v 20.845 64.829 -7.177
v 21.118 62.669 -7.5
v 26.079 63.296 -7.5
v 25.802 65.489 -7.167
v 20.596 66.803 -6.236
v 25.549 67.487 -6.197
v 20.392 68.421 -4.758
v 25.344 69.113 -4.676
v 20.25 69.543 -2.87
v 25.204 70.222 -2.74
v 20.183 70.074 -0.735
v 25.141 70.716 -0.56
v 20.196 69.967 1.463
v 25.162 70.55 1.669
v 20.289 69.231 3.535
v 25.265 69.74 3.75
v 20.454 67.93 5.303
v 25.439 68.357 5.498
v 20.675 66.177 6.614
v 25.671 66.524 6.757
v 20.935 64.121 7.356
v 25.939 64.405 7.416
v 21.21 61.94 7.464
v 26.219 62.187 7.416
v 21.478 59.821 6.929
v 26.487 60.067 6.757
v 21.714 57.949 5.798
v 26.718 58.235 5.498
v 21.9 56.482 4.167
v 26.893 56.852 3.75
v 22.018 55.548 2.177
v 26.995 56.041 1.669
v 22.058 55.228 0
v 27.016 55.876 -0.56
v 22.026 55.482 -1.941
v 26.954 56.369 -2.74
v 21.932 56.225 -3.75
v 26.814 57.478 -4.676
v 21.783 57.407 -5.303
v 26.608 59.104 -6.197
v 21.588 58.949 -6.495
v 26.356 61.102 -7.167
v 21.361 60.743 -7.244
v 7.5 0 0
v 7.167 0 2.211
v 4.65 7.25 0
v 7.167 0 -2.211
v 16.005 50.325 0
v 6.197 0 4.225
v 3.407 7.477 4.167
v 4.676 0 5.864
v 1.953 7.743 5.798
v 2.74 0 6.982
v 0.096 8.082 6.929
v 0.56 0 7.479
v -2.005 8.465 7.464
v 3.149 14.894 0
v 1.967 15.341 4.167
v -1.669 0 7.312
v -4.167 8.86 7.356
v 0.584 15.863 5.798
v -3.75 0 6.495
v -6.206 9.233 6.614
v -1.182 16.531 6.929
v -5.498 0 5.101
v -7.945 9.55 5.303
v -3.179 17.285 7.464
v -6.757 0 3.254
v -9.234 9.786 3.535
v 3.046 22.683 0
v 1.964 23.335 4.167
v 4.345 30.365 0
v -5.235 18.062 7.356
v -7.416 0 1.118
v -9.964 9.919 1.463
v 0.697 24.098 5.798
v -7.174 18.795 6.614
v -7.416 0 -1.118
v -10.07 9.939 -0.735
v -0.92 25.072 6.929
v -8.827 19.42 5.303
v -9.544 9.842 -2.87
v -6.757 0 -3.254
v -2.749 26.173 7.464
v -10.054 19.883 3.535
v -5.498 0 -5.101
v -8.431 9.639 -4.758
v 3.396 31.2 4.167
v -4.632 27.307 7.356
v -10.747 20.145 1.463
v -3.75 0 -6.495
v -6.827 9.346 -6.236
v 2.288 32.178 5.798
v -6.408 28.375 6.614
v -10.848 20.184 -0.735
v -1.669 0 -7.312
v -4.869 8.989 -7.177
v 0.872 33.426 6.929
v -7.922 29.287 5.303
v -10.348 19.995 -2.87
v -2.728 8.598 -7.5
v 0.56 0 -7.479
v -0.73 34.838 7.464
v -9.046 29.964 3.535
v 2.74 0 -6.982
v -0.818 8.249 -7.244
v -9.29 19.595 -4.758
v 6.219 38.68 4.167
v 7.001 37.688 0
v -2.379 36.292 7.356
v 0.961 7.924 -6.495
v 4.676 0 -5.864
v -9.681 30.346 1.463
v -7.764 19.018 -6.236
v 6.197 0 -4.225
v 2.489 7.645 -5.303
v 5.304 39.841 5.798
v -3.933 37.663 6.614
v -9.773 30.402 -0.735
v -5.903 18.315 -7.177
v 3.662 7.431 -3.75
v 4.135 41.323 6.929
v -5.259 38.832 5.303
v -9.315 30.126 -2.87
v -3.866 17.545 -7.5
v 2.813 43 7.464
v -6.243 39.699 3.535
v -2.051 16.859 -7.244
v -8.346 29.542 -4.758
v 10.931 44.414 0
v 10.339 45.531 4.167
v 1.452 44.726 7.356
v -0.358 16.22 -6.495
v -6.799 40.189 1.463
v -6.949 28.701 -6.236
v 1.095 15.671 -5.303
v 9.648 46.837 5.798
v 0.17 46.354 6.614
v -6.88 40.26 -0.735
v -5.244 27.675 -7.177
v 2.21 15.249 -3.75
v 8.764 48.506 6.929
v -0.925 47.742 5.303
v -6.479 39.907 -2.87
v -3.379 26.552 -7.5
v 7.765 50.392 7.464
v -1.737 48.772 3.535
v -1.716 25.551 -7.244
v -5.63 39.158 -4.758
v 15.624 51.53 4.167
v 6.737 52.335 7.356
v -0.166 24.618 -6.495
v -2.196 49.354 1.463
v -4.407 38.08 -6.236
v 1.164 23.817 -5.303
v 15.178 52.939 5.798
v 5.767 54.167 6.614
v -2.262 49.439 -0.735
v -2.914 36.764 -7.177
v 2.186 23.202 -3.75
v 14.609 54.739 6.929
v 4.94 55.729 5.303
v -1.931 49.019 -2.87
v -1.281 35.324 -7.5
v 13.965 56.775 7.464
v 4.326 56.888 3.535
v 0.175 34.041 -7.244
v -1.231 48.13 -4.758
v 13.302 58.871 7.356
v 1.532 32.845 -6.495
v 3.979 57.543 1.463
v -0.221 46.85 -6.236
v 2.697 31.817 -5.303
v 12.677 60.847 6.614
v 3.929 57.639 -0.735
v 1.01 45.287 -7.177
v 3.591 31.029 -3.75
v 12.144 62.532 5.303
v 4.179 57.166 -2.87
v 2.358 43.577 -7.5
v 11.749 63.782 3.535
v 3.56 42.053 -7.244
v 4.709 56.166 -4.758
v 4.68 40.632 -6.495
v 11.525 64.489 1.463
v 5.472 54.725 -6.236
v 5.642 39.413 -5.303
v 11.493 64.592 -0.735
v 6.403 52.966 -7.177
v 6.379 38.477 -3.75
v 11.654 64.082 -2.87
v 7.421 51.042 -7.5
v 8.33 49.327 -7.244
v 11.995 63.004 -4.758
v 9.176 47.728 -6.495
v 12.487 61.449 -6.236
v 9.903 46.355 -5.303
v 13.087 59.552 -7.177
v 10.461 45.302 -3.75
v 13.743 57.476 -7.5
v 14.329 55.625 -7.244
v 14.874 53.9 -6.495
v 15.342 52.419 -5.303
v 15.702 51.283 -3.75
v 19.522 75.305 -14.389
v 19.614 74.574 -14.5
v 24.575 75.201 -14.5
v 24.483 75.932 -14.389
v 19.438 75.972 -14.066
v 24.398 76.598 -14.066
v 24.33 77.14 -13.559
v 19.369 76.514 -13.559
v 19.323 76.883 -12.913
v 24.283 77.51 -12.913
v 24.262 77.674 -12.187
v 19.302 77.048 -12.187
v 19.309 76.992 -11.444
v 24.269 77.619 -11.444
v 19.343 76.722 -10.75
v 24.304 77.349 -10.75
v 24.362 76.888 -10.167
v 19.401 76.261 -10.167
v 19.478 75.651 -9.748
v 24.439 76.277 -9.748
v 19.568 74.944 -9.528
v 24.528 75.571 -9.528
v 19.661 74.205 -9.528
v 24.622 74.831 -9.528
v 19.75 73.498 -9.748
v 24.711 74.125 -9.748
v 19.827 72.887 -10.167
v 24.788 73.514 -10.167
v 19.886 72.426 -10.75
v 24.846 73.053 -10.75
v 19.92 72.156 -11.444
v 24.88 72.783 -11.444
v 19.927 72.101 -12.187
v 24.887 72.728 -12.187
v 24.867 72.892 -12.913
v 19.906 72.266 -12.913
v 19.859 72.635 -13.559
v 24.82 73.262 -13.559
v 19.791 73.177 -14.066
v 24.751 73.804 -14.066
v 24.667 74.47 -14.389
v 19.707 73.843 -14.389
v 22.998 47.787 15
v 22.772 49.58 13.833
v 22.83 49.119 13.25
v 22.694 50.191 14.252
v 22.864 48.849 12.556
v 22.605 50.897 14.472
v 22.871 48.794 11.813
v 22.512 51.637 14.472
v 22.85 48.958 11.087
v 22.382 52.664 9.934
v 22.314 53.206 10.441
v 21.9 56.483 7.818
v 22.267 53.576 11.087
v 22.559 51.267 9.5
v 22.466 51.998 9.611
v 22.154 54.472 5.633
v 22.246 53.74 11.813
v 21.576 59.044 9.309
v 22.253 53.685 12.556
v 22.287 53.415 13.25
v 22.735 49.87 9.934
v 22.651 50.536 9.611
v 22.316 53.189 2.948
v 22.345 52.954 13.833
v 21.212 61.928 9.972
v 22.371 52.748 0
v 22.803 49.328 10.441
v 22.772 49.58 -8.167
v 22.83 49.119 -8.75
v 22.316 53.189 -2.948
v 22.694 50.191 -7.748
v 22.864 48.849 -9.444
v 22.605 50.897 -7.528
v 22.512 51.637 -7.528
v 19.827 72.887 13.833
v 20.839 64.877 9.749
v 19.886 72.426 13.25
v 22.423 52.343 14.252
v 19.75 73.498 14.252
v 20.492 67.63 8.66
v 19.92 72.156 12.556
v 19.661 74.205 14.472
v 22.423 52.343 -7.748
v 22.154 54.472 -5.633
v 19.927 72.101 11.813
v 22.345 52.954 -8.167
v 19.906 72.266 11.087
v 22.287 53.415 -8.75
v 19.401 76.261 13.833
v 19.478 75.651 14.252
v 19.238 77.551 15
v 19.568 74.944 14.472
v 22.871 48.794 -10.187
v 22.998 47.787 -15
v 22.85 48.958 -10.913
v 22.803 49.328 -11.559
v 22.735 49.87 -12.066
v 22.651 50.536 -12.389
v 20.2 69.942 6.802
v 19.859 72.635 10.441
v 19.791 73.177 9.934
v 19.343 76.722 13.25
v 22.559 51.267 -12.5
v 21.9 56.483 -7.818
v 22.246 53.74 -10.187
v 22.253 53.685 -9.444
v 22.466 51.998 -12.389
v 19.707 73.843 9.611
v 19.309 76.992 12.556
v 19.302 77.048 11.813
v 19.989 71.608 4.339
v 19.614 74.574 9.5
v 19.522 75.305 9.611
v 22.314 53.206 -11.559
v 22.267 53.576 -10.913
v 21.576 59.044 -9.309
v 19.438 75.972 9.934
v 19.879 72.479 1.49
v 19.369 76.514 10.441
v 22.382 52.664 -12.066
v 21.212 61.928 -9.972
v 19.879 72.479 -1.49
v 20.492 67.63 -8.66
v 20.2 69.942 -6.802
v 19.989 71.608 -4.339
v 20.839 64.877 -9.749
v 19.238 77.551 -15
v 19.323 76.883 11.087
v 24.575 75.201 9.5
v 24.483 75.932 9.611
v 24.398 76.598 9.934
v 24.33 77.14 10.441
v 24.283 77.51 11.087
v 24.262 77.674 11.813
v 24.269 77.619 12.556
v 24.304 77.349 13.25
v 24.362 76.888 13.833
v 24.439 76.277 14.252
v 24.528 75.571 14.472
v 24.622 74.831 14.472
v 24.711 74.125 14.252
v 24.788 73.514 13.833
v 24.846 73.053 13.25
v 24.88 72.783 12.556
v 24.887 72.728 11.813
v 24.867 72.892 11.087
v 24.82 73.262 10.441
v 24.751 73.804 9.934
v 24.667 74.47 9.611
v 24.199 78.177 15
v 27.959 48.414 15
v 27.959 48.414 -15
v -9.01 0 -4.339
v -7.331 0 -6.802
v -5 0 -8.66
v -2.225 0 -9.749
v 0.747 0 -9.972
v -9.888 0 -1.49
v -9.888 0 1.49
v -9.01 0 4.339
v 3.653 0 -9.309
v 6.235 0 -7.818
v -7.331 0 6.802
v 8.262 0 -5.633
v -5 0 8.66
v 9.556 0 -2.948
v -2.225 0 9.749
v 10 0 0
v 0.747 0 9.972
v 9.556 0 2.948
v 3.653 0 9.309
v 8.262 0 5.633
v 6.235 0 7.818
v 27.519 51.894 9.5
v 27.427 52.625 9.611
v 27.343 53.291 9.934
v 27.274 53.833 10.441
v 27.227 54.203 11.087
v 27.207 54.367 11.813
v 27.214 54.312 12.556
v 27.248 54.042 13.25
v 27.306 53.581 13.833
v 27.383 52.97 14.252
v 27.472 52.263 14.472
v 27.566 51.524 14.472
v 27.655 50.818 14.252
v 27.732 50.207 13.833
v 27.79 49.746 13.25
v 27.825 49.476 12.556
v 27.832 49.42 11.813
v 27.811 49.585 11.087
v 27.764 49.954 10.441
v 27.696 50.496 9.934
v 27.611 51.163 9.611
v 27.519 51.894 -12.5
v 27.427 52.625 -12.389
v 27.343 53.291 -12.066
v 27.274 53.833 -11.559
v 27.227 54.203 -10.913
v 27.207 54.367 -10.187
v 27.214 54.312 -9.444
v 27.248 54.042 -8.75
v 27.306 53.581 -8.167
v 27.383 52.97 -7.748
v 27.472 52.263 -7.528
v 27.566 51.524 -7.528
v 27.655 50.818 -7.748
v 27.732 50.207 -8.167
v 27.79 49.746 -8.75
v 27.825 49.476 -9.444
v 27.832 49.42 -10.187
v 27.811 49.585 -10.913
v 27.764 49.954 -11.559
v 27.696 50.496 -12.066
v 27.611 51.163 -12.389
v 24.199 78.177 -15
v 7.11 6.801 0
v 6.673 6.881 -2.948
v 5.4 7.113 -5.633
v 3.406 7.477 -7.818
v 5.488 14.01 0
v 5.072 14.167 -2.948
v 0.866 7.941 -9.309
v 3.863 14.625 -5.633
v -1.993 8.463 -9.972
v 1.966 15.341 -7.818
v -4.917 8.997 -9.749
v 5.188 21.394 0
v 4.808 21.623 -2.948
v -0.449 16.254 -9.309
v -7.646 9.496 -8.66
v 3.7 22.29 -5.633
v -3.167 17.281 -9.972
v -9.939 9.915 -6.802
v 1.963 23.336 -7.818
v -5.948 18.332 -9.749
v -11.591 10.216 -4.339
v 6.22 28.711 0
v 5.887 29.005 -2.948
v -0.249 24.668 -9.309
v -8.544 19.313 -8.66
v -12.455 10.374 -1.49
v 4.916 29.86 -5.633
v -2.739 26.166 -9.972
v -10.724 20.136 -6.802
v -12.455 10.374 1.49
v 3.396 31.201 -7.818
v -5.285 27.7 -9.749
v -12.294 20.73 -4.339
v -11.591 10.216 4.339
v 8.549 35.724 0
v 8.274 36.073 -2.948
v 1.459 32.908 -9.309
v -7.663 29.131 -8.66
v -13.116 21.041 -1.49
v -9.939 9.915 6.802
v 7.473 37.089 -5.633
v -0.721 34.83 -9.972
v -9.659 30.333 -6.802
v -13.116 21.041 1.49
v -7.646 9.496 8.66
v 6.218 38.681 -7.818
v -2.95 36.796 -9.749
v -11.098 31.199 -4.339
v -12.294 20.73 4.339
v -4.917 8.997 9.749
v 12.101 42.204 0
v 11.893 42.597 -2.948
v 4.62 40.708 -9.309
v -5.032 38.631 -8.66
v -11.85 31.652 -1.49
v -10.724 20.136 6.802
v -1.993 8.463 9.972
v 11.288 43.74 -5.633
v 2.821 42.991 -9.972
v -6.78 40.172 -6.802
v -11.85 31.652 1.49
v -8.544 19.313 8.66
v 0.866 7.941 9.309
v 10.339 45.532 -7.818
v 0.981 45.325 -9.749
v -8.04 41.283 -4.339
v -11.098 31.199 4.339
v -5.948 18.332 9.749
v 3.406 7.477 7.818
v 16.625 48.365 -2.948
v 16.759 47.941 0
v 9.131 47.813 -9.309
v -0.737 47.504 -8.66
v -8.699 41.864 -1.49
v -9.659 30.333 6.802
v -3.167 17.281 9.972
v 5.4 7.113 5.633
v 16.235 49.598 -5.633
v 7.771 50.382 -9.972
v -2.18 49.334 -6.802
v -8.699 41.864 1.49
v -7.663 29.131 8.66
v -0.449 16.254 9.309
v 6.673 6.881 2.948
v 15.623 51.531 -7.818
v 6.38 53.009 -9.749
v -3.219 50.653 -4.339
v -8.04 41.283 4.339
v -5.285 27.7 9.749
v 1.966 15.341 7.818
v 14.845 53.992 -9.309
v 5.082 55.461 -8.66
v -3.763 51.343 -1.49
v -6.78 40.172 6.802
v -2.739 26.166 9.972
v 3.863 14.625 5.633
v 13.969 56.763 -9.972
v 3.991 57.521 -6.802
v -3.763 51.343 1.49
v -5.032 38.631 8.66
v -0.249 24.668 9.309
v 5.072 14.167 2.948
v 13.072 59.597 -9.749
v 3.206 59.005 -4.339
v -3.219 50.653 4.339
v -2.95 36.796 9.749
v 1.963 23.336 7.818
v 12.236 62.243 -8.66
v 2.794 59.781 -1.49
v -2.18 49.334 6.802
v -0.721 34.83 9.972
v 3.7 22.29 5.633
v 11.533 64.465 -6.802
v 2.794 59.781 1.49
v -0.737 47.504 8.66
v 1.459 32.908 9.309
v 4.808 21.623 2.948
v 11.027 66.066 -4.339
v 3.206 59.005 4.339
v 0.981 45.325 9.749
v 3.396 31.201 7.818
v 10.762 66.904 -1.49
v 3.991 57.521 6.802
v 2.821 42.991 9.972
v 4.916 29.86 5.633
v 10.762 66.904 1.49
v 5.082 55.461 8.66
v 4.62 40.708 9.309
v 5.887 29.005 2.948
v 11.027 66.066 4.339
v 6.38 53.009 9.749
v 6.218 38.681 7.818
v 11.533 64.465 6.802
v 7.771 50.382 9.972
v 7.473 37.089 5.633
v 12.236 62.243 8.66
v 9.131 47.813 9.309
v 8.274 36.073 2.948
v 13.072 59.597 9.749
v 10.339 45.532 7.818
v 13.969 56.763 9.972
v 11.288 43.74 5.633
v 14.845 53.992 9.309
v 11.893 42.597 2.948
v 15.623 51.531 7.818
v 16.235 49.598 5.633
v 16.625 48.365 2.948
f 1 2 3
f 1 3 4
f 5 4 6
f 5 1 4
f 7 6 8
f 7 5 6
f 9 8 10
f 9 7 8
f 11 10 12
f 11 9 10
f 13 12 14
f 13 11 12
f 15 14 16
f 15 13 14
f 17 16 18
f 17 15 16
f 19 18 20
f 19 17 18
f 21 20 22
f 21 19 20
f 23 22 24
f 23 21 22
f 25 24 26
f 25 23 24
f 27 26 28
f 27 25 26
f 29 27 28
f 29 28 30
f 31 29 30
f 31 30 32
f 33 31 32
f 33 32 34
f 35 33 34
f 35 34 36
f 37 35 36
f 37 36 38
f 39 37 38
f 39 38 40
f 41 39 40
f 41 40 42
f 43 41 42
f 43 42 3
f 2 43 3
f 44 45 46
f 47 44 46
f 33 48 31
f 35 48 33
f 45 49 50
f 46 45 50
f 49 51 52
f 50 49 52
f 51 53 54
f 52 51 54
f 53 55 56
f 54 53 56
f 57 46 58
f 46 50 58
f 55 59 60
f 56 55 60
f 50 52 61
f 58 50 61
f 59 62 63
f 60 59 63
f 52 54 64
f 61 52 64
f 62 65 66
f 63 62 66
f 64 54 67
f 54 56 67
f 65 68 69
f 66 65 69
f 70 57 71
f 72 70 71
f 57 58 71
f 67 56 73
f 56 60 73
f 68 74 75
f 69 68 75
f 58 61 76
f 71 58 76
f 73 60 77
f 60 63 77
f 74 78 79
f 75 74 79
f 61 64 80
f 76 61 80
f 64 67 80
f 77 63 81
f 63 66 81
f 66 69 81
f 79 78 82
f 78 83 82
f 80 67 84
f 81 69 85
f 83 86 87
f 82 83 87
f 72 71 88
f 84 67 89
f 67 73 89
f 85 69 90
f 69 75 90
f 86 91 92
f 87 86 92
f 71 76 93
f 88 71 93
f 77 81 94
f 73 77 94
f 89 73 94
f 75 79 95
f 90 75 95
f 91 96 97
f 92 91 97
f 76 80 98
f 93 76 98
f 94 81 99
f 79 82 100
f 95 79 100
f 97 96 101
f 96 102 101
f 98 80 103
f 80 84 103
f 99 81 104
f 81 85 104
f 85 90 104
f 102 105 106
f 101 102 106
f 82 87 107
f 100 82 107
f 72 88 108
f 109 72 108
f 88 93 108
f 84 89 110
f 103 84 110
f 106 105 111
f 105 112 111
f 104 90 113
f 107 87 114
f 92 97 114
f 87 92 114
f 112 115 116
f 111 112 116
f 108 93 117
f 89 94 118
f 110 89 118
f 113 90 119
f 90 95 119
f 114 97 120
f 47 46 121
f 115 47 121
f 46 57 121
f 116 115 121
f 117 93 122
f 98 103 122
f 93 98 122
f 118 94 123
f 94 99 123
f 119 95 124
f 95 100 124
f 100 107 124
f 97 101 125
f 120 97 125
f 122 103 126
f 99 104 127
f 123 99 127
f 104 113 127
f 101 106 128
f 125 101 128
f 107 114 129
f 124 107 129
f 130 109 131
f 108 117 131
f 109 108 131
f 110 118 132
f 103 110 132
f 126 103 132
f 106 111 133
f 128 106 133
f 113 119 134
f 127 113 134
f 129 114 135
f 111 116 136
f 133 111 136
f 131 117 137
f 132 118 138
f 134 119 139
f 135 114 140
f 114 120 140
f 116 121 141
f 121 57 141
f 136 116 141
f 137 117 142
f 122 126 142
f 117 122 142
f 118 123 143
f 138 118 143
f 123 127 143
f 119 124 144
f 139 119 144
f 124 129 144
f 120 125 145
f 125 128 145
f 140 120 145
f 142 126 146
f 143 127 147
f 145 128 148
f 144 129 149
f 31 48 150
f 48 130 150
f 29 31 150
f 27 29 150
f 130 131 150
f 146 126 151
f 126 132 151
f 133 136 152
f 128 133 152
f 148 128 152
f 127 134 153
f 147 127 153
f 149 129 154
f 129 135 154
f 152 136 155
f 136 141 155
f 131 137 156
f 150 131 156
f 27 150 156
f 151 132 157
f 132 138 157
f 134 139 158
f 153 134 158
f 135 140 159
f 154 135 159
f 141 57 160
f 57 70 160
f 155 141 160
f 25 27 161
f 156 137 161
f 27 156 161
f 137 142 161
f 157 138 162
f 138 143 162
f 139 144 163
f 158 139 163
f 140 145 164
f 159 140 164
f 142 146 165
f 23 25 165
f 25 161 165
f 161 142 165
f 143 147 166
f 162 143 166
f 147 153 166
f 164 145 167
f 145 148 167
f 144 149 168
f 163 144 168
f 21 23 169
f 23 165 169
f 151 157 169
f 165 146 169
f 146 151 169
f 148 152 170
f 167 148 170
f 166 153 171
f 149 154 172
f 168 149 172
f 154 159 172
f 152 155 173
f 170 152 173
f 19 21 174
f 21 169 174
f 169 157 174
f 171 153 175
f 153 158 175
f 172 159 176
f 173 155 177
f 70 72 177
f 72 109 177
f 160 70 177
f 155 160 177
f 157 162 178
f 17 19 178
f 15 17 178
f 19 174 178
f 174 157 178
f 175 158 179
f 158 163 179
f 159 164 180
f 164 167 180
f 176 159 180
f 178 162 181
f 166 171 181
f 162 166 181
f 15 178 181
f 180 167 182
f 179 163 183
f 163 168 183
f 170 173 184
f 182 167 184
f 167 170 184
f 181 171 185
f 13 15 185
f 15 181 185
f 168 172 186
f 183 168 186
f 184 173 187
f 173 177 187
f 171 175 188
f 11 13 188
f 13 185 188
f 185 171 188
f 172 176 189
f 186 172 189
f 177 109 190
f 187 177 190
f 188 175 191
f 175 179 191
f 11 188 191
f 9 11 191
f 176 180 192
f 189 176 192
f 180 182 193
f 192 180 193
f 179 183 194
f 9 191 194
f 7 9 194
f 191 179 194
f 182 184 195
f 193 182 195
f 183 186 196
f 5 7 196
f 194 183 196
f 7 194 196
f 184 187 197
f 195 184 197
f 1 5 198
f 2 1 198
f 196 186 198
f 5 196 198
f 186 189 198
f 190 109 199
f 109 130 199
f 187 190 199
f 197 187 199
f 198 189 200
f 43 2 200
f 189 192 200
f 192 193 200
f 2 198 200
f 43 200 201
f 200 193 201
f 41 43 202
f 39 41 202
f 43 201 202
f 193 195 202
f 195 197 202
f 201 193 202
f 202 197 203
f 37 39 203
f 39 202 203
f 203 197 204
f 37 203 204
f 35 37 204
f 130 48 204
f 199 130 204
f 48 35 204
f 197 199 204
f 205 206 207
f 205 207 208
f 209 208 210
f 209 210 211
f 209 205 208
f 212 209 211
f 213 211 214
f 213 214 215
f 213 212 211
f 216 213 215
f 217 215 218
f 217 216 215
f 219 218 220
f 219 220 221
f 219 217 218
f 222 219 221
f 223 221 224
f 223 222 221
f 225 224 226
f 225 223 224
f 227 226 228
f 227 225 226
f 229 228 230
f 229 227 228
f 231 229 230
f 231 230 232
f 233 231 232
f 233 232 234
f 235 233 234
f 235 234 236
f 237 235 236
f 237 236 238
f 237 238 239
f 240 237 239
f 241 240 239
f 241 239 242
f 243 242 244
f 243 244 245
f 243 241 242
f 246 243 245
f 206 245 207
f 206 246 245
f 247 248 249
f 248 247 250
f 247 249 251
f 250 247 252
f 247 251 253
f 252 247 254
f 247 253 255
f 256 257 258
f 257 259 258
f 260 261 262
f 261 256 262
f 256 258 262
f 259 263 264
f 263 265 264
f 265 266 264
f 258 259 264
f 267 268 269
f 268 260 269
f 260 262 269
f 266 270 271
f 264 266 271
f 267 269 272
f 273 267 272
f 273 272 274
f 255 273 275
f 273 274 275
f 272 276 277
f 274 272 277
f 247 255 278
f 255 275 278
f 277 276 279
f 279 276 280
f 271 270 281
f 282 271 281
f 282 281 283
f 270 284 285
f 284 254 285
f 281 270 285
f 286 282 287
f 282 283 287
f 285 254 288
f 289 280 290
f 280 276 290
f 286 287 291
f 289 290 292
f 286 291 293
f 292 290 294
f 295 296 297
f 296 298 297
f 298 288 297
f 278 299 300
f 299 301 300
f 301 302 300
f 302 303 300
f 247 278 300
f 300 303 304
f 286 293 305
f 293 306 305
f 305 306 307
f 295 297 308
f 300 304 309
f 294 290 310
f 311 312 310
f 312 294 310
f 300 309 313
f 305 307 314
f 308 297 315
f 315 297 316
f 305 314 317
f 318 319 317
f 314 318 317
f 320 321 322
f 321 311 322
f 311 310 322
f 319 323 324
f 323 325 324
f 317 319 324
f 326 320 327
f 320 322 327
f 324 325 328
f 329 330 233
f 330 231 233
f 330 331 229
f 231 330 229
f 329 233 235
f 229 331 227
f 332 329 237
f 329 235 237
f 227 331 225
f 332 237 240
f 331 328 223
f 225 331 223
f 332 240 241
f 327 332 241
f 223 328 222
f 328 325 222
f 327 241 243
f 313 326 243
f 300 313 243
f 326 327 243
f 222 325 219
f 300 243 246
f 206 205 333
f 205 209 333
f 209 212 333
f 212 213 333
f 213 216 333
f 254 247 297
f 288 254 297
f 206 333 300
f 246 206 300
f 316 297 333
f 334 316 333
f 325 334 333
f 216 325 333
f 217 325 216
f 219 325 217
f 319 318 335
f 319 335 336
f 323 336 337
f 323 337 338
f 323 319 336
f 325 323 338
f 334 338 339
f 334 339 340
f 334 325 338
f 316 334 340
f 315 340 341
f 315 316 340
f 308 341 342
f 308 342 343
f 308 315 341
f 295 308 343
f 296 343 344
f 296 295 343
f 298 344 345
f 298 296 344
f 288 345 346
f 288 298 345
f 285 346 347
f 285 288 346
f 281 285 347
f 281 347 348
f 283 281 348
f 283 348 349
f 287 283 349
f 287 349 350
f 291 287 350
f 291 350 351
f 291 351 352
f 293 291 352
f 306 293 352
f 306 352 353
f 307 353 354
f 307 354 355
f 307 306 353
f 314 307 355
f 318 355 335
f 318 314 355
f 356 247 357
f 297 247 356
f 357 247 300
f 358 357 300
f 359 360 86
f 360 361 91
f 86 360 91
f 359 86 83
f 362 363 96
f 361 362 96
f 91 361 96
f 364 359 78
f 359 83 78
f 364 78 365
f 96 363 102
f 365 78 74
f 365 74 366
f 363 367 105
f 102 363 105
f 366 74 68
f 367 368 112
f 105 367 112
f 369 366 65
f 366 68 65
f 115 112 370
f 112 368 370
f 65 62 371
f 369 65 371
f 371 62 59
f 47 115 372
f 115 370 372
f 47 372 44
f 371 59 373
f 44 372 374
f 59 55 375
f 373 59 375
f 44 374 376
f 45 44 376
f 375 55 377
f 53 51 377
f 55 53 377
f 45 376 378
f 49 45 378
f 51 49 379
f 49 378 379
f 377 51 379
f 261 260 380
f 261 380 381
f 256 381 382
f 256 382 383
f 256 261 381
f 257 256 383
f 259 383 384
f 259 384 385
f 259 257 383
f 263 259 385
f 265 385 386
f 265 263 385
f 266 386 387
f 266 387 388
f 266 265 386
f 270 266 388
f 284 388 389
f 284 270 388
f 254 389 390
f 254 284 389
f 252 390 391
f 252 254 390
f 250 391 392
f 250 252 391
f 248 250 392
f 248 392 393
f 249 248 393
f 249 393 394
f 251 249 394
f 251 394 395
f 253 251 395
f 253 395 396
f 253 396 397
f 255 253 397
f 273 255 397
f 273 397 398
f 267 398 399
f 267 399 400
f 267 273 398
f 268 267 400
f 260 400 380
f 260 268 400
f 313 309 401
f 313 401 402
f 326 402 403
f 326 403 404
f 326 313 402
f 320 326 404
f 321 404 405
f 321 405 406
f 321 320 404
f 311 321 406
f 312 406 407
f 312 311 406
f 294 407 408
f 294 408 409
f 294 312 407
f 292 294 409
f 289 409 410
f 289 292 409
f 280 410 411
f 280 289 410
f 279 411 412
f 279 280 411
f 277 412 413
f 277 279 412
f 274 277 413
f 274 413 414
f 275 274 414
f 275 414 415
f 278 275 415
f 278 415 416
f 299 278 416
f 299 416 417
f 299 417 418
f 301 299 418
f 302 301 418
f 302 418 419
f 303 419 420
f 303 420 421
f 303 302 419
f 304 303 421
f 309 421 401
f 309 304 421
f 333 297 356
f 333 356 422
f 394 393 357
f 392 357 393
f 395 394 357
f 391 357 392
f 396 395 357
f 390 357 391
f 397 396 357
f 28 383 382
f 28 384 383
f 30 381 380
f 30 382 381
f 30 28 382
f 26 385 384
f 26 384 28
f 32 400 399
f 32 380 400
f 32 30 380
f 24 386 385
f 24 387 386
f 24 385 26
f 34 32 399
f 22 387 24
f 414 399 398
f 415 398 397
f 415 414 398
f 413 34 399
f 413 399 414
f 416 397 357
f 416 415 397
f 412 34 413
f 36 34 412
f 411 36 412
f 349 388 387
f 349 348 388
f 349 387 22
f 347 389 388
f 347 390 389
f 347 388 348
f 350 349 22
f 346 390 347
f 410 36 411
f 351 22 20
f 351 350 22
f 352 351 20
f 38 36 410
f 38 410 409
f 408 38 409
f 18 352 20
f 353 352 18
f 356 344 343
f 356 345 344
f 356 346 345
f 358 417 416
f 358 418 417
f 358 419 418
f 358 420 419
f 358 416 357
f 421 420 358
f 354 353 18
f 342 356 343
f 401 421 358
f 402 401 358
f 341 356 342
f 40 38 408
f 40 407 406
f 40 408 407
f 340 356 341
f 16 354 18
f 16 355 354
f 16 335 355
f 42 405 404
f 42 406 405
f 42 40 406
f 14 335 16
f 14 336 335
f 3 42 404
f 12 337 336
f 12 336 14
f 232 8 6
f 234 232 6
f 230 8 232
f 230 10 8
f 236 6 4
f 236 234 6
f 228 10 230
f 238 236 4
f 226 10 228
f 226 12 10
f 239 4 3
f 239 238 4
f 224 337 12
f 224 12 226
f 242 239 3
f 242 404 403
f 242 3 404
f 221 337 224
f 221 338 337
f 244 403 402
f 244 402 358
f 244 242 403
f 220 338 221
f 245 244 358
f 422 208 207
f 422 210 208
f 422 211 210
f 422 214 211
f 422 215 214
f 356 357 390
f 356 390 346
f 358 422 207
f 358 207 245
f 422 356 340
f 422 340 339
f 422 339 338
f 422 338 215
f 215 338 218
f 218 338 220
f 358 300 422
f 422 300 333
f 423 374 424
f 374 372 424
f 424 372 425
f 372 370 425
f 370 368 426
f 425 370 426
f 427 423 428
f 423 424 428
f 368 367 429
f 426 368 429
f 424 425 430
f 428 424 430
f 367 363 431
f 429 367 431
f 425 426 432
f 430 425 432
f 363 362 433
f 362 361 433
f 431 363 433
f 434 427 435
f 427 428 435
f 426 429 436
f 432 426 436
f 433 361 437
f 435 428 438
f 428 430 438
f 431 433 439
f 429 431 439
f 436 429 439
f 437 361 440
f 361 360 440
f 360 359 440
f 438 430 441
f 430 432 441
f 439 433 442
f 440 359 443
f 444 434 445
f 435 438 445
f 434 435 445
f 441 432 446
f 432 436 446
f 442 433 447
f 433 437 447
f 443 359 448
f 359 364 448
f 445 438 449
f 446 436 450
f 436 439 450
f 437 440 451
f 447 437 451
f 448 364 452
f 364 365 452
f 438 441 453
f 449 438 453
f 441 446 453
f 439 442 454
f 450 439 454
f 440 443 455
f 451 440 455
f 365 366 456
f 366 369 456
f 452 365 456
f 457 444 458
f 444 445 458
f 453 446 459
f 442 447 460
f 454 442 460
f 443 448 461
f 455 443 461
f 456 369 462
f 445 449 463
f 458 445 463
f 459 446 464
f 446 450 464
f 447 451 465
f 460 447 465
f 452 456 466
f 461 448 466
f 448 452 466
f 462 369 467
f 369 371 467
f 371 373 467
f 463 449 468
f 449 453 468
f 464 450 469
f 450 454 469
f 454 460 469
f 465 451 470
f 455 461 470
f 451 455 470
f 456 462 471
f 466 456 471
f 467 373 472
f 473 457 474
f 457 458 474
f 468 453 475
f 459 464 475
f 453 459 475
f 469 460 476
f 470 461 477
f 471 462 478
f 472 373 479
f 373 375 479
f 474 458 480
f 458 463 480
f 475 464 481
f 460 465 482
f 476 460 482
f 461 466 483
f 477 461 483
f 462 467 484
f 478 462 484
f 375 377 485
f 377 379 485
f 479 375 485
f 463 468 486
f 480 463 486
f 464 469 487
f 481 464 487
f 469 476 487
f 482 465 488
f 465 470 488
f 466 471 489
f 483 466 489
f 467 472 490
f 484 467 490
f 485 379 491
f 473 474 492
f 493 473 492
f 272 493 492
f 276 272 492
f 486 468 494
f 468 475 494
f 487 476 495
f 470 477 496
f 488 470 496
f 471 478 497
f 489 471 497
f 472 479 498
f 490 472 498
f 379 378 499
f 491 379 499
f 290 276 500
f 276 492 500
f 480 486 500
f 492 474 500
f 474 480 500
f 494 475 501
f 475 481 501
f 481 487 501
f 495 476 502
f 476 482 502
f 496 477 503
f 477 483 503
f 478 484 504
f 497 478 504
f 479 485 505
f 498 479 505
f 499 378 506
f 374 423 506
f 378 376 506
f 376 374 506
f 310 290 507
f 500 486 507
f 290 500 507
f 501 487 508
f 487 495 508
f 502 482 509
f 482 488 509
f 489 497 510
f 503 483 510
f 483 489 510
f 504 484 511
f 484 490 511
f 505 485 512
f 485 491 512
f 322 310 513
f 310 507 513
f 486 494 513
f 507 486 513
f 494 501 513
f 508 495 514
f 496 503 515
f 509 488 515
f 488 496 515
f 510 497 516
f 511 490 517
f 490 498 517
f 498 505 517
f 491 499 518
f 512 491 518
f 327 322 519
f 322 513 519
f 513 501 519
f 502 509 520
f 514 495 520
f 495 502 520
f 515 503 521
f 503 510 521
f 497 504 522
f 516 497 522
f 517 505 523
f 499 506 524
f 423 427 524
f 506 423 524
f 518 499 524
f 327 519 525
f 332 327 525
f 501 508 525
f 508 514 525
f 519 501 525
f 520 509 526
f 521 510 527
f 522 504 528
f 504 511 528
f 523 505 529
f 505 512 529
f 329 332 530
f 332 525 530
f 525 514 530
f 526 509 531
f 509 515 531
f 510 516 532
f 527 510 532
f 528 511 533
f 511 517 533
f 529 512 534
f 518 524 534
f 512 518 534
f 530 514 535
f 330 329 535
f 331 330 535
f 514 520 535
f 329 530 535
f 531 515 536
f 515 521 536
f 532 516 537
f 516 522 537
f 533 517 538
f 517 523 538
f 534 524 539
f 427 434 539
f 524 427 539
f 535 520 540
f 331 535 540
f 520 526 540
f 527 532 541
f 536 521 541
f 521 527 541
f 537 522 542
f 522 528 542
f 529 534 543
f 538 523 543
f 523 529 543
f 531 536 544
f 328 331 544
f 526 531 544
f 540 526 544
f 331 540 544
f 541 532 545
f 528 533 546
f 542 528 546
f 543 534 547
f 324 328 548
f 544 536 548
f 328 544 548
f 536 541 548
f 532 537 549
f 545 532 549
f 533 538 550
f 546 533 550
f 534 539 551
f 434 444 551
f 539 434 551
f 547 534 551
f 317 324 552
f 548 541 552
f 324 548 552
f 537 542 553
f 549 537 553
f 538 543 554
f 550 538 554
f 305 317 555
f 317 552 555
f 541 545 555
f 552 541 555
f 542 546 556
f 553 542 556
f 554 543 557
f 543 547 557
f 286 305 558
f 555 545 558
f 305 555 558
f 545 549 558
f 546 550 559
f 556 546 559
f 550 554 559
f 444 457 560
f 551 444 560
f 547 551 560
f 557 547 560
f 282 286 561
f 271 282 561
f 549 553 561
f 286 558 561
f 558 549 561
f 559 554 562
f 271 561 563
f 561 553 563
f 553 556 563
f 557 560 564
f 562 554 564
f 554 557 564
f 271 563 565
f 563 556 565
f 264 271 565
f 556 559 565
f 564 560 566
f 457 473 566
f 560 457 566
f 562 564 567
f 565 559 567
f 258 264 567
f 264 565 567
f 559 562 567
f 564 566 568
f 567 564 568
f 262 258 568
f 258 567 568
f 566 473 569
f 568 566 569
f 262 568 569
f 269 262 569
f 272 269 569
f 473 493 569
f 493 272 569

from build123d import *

# Parameters (mm, degrees)
SKETCH1_R           = 10
SKETCH1_R_2         = 7.5
SKETCH4_W           = 30
SKETCH4_H           = 30
SKETCH4_R           = 2.5
SKETCH4_R_2         = 7.5
BOSS_EXTRUDE3_DEPTH = 5


with BuildPart() as part:
    # Sweep3: sweep along a path in Sketch2
    with BuildLine(Plane.XY) as sweep3_path:
        ThreePointArc((0, 0), (-1.281289086, 35.324459387), (21.11820567, 62.668960981))
    # Sketch1 → Sweep3 (sweep)
    with BuildSketch(Plane(origin=(0, 0, 0), x_dir=(1, 0, 0), z_dir=(0, 1, 0))):
        Circle(SKETCH1_R)
        Circle(SKETCH1_R_2, mode=Mode.SUBTRACT)
    sweep(path=sweep3_path.line)

    # Sketch4 → Boss-Extrude3 (add)
    with BuildSketch(Plane(origin=(28.578554789, 3.610056753, 0), x_dir=(0, 0, -1), z_dir=(0.992115799, 0.125324544, 0))):
        with Locations((0, 59.528236809)):
            Rectangle(SKETCH4_W, SKETCH4_H)
        with Locations((-12, 71.528236809)):
            Circle(SKETCH4_R, mode=Mode.SUBTRACT)
        with Locations((12, 71.528236809)):
            Circle(SKETCH4_R, mode=Mode.SUBTRACT)
        with Locations((10, 48.035708089)):
            Circle(SKETCH4_R, mode=Mode.SUBTRACT)
        with Locations((-12, 48.035708089)):
            Circle(SKETCH4_R, mode=Mode.SUBTRACT)
        with Locations((0, 59.528236809)):
            Circle(SKETCH4_R_2, mode=Mode.SUBTRACT)
    extrude(amount=BOSS_EXTRUDE3_DEPTH)


solid = part.part
